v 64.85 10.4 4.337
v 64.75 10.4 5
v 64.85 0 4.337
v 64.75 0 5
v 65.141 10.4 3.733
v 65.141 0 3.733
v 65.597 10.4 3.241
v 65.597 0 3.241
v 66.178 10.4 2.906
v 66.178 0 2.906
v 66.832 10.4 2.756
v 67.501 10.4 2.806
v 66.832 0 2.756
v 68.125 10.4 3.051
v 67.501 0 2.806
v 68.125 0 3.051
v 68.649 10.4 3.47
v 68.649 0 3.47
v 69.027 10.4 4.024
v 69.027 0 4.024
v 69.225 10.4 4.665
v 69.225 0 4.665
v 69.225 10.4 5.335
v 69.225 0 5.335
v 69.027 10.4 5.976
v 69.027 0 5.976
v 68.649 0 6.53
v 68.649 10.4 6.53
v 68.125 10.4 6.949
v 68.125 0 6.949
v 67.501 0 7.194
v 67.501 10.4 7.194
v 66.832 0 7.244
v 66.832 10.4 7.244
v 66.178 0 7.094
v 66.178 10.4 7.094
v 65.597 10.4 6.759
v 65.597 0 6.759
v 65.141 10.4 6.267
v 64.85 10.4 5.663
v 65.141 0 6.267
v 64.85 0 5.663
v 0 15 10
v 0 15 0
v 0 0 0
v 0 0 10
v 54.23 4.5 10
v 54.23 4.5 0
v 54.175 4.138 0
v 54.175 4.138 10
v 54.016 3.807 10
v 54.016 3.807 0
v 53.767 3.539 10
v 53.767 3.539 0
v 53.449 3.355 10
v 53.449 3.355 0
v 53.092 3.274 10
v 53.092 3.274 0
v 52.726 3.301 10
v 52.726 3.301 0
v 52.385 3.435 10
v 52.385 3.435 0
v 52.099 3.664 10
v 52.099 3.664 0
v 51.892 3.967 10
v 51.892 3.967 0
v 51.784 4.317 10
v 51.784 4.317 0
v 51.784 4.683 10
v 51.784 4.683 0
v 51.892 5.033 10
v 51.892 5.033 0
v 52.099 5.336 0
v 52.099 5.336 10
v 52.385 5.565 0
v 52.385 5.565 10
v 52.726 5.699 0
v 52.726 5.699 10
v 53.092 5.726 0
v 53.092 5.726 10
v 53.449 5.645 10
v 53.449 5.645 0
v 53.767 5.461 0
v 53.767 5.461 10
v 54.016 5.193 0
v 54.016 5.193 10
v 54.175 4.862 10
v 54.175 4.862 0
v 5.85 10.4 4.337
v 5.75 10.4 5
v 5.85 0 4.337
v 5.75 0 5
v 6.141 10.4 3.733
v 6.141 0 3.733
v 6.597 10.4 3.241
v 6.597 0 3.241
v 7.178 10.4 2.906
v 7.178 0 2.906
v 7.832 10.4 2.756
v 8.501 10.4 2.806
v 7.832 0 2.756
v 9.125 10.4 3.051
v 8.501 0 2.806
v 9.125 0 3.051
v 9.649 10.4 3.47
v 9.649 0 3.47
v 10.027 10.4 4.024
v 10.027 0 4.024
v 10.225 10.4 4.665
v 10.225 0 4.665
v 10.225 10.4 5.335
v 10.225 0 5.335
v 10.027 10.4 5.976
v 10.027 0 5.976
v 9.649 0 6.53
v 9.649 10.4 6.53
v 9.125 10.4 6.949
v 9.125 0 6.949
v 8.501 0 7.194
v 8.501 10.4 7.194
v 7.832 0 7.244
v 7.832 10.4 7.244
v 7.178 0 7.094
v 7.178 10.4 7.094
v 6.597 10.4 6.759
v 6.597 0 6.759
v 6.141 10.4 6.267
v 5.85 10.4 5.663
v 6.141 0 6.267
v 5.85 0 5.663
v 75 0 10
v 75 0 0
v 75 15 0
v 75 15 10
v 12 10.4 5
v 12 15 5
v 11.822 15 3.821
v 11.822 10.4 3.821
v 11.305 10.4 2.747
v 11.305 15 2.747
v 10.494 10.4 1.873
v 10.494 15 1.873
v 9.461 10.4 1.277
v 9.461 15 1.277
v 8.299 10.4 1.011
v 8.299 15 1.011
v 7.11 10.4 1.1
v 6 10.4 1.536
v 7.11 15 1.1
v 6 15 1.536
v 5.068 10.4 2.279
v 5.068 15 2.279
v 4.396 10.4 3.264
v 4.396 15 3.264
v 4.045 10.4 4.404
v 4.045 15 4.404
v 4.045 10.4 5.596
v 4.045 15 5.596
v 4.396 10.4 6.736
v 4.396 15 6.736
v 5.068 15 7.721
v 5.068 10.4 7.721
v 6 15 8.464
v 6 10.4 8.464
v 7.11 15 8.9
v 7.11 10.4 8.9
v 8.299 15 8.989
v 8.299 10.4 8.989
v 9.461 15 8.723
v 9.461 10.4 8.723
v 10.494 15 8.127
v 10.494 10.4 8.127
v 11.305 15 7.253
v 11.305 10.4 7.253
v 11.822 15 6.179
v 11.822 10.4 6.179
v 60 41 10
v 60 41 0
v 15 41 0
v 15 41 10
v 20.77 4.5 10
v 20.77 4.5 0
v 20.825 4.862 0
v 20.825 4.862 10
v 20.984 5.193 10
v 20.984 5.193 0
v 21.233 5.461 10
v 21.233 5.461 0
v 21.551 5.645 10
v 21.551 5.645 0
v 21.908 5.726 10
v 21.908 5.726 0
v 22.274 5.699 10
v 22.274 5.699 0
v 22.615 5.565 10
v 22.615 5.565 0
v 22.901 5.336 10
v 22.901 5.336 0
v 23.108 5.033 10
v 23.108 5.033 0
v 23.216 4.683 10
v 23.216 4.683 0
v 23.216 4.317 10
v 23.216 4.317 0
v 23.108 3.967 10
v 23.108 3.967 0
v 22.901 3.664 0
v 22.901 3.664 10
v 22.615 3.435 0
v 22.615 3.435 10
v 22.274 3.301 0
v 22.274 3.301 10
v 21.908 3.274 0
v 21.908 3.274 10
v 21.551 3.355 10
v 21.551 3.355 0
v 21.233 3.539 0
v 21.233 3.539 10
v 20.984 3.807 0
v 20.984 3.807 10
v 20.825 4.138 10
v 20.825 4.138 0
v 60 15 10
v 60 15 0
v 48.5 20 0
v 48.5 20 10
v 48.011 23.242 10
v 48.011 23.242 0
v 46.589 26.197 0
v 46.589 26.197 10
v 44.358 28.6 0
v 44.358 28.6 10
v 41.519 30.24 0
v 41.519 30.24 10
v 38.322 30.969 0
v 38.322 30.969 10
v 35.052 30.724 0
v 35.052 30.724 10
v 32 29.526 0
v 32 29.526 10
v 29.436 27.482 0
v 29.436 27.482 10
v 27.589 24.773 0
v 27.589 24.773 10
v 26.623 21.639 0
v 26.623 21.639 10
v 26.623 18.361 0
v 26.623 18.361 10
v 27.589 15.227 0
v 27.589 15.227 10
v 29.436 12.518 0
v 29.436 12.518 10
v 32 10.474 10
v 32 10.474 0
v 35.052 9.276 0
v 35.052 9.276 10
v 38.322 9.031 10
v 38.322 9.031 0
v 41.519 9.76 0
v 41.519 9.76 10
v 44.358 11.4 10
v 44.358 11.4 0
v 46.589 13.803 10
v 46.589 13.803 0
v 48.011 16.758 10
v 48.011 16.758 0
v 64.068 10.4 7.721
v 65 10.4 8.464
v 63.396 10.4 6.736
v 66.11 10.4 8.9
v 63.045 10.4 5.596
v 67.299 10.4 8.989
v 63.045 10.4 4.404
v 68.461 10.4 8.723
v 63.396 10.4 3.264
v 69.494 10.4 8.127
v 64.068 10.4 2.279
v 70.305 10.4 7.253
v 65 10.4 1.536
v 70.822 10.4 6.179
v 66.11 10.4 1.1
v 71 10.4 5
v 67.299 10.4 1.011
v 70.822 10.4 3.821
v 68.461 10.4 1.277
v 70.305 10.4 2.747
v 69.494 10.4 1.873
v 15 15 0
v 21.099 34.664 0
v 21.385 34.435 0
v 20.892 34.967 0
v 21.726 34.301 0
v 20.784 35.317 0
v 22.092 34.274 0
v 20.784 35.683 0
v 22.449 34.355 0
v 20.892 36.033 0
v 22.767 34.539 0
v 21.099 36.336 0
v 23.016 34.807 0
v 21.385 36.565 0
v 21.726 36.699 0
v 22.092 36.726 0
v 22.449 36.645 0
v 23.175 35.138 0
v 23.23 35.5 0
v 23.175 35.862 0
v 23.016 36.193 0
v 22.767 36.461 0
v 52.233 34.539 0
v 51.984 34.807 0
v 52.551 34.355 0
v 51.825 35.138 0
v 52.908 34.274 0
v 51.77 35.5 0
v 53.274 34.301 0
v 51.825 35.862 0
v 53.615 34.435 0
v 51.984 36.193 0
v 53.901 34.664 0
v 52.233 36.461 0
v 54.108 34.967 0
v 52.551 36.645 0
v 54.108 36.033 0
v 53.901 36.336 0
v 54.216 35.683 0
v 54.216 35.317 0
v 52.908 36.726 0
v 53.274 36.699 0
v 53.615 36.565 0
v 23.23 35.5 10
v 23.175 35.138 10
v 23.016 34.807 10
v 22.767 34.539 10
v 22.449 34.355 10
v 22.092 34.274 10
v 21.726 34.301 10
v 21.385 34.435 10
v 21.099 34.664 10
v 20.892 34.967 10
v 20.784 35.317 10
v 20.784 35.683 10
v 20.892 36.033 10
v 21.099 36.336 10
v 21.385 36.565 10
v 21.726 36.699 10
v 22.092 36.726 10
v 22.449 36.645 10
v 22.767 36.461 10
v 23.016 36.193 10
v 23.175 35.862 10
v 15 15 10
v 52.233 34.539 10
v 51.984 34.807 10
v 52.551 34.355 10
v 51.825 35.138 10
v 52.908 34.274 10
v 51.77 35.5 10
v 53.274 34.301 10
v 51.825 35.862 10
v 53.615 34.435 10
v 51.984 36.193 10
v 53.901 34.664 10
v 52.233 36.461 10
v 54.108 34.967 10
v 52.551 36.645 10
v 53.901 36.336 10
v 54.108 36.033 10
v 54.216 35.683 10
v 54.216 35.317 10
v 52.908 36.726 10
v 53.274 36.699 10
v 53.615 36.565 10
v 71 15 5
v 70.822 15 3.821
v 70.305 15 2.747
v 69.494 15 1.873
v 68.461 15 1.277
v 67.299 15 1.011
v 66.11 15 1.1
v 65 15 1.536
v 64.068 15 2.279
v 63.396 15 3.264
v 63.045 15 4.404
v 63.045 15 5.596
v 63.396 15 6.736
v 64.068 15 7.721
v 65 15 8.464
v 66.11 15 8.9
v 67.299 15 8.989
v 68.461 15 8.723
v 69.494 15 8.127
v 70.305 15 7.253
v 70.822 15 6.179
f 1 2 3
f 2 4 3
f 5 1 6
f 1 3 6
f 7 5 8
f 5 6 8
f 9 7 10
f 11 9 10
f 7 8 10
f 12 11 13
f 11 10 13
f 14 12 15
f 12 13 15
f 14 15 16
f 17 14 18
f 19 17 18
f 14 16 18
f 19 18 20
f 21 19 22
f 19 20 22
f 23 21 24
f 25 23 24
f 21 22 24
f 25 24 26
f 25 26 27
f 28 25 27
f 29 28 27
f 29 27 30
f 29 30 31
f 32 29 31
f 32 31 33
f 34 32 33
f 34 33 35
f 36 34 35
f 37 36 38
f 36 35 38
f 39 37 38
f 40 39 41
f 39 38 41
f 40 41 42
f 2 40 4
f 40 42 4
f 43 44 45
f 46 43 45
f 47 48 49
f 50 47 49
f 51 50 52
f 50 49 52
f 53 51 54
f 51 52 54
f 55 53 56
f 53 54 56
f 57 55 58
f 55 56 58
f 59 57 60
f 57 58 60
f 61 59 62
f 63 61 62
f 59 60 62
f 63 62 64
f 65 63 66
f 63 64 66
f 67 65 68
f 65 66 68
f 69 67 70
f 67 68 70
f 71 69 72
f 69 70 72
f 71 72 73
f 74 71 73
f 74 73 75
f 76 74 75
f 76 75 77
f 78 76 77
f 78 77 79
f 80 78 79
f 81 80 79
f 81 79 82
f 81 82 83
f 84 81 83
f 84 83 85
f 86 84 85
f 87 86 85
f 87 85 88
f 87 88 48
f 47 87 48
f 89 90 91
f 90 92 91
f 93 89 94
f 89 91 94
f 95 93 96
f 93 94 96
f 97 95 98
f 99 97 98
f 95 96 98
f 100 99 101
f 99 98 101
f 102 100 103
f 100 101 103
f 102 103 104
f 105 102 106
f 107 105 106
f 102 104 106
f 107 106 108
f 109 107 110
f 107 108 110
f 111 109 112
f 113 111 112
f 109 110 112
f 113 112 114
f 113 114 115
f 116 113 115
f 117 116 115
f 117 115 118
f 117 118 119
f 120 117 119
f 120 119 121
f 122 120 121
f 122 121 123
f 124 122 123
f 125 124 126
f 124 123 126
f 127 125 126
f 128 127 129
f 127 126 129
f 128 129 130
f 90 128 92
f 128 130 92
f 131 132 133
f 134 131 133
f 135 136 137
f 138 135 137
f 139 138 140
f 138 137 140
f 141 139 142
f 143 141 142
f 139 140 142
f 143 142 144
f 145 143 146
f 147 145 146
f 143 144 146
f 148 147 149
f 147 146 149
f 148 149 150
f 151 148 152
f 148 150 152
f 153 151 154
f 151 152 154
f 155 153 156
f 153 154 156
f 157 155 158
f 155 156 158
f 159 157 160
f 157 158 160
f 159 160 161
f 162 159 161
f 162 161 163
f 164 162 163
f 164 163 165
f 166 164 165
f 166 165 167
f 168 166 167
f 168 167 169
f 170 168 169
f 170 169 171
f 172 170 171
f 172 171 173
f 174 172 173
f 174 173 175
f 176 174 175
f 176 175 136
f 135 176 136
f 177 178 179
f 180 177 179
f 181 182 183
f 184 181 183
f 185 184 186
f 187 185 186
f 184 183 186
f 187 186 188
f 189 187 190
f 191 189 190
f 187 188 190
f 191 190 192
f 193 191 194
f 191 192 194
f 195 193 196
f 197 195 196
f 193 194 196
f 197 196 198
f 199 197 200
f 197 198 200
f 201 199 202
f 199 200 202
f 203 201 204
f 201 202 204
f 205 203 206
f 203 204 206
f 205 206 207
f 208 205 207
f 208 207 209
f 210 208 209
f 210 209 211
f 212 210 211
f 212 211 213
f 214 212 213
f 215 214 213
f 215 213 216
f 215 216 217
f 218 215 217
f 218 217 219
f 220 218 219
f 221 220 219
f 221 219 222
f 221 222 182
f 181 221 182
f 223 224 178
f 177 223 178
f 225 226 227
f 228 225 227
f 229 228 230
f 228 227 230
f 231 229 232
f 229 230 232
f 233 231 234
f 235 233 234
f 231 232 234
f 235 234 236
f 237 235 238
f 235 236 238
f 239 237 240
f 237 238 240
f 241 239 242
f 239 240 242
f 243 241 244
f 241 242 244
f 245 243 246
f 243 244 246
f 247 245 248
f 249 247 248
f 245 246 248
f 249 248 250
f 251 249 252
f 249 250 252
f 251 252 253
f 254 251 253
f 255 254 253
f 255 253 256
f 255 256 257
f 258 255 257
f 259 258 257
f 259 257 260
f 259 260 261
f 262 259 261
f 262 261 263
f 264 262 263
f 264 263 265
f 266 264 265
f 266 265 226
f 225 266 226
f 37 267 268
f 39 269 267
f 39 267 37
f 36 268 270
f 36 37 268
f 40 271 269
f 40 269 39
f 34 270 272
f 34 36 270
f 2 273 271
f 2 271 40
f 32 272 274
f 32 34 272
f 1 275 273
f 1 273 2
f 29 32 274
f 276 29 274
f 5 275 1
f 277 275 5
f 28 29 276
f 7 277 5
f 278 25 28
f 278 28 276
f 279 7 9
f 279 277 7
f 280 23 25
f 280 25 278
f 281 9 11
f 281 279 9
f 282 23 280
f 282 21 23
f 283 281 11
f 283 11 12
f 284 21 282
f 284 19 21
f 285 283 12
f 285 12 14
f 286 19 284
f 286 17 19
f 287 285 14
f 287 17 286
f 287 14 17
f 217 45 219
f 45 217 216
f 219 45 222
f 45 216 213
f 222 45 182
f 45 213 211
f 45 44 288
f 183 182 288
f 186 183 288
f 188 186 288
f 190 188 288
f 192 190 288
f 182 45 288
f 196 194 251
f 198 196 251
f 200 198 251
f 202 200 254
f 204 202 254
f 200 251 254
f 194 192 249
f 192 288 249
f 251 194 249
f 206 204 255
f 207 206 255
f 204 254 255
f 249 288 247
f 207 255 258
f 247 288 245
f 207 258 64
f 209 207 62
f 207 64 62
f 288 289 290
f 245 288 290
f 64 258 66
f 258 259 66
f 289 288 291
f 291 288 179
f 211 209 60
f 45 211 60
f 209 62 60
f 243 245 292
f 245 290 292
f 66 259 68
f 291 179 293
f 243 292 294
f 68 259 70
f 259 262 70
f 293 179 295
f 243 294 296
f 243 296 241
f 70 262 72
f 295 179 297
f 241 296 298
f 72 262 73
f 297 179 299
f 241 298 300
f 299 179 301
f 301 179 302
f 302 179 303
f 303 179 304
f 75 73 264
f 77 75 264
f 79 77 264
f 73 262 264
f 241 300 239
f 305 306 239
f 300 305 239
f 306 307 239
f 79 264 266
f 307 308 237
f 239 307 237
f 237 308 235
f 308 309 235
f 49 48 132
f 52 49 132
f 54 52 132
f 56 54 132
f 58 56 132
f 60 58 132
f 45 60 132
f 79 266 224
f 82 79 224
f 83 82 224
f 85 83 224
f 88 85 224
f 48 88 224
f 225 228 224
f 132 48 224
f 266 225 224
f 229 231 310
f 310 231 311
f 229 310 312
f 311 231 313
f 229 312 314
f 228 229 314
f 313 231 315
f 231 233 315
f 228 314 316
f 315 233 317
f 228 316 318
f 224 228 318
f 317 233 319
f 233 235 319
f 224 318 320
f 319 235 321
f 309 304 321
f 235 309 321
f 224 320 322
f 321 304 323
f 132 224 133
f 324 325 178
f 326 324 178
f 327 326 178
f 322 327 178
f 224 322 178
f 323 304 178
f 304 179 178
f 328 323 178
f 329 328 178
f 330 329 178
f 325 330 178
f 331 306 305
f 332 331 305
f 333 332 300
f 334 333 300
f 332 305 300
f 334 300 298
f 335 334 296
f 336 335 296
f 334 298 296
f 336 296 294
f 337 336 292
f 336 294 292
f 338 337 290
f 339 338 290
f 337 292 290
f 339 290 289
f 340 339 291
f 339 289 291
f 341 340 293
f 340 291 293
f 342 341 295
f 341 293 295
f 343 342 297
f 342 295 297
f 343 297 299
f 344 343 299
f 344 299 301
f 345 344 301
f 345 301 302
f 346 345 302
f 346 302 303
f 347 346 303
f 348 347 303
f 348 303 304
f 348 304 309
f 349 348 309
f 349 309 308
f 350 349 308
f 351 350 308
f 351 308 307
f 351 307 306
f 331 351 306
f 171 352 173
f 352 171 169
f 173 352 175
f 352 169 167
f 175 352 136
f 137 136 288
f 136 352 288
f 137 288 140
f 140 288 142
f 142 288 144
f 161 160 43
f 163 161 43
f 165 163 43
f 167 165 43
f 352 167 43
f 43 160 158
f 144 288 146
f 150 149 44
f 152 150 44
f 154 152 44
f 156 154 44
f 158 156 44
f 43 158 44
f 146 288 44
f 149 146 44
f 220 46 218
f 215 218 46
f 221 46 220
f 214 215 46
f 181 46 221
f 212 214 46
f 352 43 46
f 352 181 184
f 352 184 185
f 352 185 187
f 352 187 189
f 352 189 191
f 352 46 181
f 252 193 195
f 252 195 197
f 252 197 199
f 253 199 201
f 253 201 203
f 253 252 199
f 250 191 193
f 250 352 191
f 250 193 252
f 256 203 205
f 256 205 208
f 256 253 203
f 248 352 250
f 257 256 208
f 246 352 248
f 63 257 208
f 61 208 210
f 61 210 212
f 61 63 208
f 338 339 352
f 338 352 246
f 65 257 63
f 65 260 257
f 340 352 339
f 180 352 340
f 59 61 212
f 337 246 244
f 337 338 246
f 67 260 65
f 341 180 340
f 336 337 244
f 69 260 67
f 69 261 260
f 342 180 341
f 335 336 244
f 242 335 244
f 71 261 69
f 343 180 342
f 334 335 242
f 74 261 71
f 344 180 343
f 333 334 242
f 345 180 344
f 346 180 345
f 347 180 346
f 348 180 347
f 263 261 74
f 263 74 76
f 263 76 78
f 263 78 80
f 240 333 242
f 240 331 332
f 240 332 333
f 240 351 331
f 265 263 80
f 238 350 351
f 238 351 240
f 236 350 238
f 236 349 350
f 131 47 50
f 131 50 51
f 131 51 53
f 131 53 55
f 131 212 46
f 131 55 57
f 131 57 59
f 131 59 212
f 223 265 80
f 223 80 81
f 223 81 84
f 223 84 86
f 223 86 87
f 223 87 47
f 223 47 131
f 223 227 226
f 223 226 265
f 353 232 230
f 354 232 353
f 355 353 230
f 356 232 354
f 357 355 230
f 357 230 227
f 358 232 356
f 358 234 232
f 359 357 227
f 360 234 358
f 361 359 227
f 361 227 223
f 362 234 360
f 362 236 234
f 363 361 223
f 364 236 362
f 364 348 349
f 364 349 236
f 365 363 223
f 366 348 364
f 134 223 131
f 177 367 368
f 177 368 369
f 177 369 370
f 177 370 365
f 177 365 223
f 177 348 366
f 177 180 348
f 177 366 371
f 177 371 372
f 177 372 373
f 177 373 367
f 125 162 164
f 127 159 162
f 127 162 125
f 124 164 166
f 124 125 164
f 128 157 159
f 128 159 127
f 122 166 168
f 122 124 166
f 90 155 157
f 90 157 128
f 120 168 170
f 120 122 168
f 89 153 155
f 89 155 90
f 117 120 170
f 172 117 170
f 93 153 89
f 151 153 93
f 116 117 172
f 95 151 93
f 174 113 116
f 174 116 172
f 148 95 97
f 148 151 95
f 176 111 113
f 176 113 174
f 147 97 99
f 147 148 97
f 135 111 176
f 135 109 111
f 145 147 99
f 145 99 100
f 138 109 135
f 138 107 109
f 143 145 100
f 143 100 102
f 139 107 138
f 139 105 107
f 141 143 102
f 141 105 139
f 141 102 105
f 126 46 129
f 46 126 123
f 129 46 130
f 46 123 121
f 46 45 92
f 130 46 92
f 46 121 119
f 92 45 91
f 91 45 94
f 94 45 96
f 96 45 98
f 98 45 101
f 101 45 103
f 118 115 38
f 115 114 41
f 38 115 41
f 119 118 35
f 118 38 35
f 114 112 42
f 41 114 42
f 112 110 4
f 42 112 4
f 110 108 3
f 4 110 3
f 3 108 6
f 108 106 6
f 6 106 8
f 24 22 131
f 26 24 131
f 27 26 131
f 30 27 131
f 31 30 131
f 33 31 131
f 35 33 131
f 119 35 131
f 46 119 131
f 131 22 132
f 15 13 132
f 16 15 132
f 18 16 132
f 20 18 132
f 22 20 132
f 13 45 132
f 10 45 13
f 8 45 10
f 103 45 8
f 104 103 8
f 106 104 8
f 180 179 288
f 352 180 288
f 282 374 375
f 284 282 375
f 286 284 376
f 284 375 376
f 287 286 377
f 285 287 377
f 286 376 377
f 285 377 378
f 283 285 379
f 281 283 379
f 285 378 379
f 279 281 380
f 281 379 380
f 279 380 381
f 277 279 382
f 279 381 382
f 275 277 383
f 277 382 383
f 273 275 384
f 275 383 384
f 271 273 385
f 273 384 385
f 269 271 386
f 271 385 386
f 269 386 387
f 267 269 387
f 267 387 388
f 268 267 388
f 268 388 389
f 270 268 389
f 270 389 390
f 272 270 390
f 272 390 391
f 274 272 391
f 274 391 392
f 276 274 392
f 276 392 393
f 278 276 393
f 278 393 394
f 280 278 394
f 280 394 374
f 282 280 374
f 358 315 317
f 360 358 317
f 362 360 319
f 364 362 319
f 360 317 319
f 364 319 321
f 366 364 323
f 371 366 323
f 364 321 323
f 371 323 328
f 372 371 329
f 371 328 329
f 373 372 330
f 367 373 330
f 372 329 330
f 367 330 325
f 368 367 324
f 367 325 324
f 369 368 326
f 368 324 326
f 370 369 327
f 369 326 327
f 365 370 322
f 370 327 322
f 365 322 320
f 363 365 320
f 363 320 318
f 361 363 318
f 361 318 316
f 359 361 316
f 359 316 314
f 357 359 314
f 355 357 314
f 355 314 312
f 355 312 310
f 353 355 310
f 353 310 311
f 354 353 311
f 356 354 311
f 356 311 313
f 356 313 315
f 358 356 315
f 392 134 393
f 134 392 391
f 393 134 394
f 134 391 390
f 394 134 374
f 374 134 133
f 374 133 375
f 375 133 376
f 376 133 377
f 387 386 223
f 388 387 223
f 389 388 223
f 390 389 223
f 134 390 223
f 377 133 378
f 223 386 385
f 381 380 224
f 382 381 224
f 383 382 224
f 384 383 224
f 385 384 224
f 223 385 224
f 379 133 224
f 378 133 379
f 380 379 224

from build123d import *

# Parameters (mm, degrees)
EXTRUDE_1_DEPTH              = 10
SKETCH_2_R                   = 11
CUT_EXTRUDE_1_DEPTH          = 87.058119896
HOLE_WIZARD_M4_1_D           = 4.5
HOLE_WIZARD_M4_1_CBORE_D     = 8
HOLE_WIZARD_M4_1_CBORE_DEPTH = 4.6
SKETCH_3_R                   = 1.2295
CUT_EXTRUDE_2_DEPTH          = 87.058119896


with BuildPart() as part:
    # 草图1 → 凸台-拉伸1 (new body)
    with BuildSketch(Plane.XY):
        Polygon((0, 0), (75, 0), (75, 15), (60, 15), (60, 41), (15, 41), (15, 15), (0, 15), align=None)
    extrude(amount=EXTRUDE_1_DEPTH)

    # 草图2 → 切除-拉伸1 (cut, through all)
    with BuildSketch(Plane.XY.offset(10)):
        with Locations((37.5, 20)):
            Circle(SKETCH_2_R)
    extrude(amount=-CUT_EXTRUDE_1_DEPTH, mode=Mode.SUBTRACT)

    # M4 六角圆柱头螺钉的柱形沉头孔1 (through all)
    with Locations(Plane(origin=(8, 15, 5), x_dir=(1, 0, 0), z_dir=(0, 1, 0))):
        with Locations((0, 0), (59, 0)):
            CounterBoreHole(HOLE_WIZARD_M4_1_D / 2, HOLE_WIZARD_M4_1_CBORE_D / 2, HOLE_WIZARD_M4_1_CBORE_DEPTH)

    # 草图3 → 切除-拉伸2 (cut, through all)
    with BuildSketch(Plane(origin=(0, 0, 0), x_dir=(-1, 0, 0), z_dir=(0, 0, -1))):
        with Locations((-22, 4.5)):
            Circle(SKETCH_3_R)
        with Locations(Location((-53, 4.5, 0), (0, 0, 180))):
            Circle(SKETCH_3_R)
        with Locations((-53, 35.5)):
            Circle(SKETCH_3_R)
        with Locations(Location((-22, 35.5, 0), (0, 0, 180))):
            Circle(SKETCH_3_R)
    extrude(amount=-CUT_EXTRUDE_2_DEPTH, mode=Mode.SUBTRACT)


solid = part.part
